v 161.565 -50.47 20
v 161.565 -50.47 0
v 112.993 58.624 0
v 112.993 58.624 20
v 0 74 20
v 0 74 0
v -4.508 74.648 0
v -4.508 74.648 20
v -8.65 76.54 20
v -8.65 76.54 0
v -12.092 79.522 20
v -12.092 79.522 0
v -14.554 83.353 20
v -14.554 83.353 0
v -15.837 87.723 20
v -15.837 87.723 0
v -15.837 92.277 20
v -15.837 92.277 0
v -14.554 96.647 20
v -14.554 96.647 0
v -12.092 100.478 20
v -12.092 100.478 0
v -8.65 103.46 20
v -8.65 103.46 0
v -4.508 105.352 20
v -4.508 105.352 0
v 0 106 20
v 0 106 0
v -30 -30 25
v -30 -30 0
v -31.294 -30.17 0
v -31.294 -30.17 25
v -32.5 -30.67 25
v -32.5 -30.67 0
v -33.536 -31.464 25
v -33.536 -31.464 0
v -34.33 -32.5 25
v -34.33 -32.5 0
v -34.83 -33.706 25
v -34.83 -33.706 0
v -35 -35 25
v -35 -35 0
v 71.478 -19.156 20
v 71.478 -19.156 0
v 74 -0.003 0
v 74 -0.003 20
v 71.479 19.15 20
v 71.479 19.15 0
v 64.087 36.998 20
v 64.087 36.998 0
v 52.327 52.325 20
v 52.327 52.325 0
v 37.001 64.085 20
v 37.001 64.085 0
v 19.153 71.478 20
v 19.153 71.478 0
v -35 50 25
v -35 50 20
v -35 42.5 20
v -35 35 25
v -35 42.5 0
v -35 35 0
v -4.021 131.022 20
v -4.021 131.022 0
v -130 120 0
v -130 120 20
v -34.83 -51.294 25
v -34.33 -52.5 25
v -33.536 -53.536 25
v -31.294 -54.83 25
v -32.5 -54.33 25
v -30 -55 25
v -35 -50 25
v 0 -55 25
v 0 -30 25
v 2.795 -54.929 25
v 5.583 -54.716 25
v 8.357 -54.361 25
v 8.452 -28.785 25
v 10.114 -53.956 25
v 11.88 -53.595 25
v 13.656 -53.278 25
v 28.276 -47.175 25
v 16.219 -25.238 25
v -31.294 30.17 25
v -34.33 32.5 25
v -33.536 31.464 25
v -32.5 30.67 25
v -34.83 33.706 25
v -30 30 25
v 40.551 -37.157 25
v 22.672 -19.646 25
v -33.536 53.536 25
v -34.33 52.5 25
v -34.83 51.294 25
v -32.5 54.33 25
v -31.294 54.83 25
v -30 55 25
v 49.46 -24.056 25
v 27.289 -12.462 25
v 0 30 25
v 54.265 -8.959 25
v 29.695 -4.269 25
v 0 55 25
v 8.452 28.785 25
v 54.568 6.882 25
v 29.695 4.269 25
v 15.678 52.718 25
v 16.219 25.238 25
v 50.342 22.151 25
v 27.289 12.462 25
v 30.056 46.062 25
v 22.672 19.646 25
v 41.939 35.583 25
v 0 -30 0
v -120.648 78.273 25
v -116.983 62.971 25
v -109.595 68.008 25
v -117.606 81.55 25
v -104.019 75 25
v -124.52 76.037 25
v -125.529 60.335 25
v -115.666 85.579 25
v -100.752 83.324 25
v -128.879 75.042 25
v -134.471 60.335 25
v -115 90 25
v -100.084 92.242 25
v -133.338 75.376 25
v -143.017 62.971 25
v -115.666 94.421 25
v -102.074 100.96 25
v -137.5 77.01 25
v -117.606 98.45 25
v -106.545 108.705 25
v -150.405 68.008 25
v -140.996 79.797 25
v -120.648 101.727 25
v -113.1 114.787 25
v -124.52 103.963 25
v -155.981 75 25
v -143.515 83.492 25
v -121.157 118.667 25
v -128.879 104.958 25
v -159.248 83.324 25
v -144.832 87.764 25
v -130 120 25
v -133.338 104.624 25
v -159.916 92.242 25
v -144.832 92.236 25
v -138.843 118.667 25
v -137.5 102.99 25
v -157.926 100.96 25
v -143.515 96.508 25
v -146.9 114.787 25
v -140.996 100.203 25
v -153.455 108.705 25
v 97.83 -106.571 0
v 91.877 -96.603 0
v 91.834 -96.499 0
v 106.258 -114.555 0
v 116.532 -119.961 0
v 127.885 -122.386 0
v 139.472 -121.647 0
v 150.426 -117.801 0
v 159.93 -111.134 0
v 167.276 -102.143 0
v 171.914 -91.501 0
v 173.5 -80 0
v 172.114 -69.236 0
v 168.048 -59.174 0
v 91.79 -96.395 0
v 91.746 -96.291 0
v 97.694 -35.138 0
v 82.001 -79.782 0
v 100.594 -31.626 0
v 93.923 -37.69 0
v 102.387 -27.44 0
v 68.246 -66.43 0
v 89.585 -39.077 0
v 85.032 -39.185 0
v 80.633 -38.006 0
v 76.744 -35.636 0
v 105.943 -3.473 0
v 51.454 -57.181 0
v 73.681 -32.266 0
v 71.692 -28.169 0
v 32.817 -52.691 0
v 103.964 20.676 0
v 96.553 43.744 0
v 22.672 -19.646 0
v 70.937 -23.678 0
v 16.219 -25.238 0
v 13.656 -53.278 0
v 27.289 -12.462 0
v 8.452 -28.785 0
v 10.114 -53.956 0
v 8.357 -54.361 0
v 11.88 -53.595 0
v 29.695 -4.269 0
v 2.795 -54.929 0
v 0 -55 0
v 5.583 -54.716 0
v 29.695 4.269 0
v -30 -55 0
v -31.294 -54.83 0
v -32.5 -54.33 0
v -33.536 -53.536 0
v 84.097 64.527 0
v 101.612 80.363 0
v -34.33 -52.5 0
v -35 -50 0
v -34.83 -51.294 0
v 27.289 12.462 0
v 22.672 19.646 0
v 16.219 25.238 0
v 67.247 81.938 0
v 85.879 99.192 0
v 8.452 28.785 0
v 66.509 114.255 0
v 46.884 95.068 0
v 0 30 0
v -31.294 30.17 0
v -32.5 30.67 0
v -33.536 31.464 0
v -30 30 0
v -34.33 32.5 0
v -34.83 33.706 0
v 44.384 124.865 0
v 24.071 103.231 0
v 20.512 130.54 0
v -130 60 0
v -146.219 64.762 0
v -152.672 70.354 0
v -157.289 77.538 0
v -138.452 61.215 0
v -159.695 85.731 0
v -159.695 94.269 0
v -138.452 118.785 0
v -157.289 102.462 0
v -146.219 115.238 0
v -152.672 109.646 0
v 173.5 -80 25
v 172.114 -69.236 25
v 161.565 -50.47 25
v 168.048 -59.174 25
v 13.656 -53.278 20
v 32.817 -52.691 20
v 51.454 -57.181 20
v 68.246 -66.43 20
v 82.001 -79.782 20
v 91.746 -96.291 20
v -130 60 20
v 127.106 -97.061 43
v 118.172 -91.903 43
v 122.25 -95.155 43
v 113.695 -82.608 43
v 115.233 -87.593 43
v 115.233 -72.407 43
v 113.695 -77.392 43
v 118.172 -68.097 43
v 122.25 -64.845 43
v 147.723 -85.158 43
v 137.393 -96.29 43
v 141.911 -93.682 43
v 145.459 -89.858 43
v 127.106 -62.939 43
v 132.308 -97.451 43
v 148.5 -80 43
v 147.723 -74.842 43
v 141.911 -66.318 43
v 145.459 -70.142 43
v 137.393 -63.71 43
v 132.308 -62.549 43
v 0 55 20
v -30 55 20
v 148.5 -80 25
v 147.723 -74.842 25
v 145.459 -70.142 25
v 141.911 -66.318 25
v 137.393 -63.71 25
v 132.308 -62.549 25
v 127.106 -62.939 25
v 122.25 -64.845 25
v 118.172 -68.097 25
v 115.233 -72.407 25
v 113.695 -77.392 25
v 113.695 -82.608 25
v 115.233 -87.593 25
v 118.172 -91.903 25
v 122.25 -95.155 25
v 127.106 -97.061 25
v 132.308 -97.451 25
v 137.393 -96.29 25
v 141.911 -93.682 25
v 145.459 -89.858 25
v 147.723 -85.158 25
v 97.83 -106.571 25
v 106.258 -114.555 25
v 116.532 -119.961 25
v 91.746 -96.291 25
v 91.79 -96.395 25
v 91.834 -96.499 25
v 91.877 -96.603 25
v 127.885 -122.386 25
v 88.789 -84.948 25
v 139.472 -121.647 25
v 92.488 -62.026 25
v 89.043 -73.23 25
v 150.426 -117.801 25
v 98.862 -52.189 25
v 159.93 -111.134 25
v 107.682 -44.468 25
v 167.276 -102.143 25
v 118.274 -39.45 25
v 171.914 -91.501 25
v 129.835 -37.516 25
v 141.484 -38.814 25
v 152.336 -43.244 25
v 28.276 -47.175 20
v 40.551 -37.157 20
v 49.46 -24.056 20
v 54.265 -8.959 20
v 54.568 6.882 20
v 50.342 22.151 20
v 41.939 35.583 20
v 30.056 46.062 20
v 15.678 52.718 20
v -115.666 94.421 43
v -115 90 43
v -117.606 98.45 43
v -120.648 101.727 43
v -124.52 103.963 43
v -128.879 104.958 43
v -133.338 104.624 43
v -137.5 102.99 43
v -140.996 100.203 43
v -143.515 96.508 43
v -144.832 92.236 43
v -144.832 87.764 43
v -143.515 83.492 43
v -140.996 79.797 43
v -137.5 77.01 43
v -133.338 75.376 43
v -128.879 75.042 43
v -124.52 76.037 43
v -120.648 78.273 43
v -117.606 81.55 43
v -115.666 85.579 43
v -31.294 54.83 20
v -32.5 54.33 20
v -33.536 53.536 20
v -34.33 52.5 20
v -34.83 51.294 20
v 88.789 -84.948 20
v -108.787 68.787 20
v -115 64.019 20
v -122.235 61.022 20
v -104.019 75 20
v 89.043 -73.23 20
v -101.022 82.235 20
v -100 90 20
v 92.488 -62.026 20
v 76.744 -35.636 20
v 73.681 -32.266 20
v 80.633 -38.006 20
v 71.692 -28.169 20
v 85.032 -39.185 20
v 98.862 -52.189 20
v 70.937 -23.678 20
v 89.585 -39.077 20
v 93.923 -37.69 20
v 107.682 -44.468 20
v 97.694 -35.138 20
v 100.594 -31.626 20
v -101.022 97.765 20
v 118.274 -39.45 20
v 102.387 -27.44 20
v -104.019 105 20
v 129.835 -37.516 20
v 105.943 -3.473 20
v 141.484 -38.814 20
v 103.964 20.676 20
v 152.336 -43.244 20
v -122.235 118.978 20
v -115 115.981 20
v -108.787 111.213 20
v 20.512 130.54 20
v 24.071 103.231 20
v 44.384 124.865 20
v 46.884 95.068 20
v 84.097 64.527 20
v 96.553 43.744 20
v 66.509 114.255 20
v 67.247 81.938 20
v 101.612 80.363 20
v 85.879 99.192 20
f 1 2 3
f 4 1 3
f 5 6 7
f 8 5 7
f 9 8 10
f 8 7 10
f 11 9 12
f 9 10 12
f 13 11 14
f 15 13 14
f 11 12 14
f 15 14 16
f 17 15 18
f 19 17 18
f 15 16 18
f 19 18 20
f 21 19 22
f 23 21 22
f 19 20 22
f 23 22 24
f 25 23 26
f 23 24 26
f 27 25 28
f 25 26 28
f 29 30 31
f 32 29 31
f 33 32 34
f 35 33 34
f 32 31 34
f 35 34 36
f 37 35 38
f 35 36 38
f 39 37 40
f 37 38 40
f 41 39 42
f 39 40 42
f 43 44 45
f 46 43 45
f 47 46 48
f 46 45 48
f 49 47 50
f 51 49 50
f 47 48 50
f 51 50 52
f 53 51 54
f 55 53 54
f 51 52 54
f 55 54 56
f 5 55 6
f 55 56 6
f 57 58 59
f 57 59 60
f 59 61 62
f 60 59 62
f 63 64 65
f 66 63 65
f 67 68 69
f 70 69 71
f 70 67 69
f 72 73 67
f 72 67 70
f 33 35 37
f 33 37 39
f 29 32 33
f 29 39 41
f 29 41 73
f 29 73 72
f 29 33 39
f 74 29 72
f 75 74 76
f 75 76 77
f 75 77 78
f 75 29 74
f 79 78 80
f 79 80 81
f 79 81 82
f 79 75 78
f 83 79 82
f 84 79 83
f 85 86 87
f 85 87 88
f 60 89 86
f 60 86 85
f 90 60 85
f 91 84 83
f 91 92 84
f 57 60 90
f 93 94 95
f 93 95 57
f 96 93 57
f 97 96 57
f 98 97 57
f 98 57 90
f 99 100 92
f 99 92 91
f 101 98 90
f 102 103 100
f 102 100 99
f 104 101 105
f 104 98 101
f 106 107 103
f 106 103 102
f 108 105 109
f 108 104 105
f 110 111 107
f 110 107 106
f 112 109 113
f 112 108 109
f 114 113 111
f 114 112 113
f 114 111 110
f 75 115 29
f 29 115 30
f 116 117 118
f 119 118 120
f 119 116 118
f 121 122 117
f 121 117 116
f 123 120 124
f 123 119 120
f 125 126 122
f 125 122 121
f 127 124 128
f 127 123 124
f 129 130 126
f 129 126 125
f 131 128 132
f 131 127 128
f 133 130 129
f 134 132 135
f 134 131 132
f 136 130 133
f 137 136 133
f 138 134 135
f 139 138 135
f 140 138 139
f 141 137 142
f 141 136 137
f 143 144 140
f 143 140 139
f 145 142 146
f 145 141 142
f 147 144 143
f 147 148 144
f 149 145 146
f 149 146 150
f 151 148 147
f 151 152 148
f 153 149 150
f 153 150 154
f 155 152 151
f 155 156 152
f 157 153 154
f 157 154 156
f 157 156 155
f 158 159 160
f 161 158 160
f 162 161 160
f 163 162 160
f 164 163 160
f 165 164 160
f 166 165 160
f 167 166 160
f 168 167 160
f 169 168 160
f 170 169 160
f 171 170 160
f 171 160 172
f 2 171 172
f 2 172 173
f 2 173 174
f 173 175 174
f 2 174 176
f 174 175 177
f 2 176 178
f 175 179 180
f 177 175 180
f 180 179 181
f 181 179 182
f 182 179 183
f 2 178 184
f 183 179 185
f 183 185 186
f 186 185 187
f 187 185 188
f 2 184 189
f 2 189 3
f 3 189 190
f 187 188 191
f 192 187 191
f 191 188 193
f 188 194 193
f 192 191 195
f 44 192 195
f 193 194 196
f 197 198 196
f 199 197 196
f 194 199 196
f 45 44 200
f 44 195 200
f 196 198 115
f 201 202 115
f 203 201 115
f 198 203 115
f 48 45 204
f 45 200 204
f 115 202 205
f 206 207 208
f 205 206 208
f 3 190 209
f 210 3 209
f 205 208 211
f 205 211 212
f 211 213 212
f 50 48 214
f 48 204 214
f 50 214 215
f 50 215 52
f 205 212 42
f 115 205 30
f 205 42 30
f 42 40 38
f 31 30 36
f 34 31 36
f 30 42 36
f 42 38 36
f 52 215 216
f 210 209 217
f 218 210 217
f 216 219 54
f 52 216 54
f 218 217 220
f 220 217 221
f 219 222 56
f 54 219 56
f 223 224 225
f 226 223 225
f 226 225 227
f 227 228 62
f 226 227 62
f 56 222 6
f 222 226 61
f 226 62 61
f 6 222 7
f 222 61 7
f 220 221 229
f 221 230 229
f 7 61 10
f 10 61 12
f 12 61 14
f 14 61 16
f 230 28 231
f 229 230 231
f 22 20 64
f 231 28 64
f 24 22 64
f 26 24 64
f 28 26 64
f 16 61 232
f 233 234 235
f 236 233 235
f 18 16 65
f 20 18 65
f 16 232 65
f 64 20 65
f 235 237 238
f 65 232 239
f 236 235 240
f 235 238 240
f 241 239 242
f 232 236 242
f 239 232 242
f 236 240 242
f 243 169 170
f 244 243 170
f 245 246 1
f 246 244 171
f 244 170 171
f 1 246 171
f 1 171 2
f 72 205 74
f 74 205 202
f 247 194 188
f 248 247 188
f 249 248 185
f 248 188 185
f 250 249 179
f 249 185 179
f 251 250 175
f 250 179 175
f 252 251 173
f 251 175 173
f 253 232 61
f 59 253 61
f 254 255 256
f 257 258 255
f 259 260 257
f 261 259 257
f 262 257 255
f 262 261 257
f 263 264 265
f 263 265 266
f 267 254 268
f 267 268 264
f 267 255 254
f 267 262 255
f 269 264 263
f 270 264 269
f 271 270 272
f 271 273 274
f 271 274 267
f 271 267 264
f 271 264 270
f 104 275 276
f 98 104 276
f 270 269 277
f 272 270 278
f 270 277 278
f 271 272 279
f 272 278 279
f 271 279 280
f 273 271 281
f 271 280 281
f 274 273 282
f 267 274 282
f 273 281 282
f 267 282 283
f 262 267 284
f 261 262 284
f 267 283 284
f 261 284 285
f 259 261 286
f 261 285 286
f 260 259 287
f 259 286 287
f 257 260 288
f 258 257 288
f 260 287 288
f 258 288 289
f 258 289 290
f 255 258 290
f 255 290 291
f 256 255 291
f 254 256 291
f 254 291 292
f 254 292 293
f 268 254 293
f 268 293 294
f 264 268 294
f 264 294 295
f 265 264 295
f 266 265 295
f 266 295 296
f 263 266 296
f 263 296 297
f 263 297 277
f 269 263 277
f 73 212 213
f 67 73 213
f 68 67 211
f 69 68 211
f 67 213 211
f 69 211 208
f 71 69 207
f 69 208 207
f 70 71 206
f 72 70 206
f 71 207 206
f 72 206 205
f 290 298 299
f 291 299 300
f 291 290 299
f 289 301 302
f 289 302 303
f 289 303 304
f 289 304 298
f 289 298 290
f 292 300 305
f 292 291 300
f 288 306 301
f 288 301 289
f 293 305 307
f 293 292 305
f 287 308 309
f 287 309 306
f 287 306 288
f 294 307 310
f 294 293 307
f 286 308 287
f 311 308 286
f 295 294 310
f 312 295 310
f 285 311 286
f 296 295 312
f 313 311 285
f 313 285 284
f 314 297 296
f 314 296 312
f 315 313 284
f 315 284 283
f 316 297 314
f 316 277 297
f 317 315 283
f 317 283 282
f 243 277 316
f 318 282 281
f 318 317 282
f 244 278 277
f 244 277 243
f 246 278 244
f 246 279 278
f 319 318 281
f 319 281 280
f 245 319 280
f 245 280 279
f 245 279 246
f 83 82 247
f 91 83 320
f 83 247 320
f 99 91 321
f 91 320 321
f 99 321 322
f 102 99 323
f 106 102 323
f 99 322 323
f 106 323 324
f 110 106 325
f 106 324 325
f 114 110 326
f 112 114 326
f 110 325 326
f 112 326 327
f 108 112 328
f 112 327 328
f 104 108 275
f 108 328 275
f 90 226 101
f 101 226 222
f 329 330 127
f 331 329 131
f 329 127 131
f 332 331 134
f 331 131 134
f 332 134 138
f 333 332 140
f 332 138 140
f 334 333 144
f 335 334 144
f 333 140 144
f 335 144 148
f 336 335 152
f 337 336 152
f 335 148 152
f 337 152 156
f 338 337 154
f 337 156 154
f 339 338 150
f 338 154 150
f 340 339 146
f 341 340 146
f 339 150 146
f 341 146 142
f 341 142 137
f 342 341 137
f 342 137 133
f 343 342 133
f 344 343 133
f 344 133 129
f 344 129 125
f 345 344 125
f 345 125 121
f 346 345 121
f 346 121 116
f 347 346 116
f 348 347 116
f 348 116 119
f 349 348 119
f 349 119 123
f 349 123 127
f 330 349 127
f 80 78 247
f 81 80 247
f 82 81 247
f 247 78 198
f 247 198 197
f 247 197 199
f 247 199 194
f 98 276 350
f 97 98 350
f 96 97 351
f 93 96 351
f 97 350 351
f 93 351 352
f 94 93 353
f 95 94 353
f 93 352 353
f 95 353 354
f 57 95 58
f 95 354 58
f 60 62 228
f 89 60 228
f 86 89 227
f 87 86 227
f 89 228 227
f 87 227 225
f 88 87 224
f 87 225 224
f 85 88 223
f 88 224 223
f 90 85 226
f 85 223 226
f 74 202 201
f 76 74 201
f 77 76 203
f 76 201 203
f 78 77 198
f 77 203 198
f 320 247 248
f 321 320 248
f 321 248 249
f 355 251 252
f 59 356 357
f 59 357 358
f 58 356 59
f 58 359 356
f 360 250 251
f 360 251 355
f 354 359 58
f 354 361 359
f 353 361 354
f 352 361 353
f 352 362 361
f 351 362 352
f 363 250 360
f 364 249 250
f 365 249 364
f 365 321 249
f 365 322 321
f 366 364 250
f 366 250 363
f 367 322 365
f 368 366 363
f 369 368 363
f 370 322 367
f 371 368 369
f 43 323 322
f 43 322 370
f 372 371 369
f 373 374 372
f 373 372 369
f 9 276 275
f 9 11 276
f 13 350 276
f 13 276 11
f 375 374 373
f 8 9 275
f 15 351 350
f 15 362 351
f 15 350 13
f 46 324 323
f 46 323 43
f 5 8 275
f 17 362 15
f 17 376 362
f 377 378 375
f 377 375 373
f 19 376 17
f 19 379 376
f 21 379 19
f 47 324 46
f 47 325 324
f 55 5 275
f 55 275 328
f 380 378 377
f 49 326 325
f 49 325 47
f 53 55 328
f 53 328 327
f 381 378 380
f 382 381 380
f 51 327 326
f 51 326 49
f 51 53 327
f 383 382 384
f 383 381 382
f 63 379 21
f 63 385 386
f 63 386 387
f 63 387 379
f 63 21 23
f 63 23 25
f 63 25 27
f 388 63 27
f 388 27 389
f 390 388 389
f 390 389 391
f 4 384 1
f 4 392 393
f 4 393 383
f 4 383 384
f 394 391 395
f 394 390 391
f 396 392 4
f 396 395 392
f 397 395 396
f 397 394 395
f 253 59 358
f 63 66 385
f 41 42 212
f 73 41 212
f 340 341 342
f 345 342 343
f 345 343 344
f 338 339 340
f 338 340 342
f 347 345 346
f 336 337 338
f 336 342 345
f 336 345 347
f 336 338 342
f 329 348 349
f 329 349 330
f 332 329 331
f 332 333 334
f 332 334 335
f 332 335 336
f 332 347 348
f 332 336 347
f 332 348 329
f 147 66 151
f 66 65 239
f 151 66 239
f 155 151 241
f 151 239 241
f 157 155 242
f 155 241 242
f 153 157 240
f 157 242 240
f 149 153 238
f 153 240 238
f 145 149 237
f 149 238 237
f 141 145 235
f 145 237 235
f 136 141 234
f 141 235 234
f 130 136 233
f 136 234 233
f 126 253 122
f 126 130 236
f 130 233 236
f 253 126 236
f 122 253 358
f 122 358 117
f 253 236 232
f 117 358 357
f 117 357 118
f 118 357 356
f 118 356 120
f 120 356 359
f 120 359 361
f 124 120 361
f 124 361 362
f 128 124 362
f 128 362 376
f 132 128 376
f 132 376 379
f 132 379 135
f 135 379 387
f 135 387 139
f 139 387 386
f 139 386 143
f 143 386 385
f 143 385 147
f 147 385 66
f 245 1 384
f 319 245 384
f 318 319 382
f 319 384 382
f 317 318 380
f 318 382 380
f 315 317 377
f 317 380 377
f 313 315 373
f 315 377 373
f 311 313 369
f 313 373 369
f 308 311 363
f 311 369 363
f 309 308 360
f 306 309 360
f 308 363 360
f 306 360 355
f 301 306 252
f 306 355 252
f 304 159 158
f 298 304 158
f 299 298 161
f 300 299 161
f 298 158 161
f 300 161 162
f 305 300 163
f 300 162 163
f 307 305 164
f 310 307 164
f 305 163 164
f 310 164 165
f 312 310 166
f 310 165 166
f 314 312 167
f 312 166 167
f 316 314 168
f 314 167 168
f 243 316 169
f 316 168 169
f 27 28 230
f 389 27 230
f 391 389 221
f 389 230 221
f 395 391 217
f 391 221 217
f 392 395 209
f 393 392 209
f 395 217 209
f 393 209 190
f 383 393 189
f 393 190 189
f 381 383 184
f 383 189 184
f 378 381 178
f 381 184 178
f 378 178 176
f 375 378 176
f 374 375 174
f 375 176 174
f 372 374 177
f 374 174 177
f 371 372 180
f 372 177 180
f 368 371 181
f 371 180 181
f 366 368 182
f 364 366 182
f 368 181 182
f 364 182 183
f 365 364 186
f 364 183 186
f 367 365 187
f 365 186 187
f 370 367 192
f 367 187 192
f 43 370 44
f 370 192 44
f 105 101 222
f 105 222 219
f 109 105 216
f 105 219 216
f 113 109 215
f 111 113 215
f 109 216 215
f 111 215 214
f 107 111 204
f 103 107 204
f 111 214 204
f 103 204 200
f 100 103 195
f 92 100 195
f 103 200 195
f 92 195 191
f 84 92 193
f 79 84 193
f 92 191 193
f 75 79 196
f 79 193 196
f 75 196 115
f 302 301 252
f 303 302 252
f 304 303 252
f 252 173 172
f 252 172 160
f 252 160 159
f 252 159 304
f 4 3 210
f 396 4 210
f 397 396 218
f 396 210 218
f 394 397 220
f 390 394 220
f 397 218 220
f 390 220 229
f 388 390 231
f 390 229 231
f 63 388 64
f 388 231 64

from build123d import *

# Parameters (mm, degrees)
BOSS_EXTRUDE4_DEPTH = 20
SKETCH1_5_R         = 30
SKETCH1_5_R_2       = 15
SKETCH1_5_R_3       = 17.5
BOSS_EXTRUDE5_DEPTH = 25
SKETCH1_6_R         = 15
SKETCH1_6_R_2       = 17.5
BOSS_EXTRUDE6_DEPTH = 43


with BuildPart() as part:
    # Sketch1 → Boss-Extrude4 (new body)
    with BuildSketch(Plane.XY):
        with BuildLine():
            Line((-130, 60), (-35, 42.5))
            Line((-35, 42.5), (-35, 50))
            ThreePointArc((-35, 50), (-33.535533906, 53.535533906), (-30, 55))
            Line((-30, 55), (0, 55))
            ThreePointArc((0, 55), (54.567759373, 6.881833839), (13.655500107, -53.277831382))
            ThreePointArc((13.655500107, -53.277831382), (60.158955917, -61.243831597), (91.746142625, -96.2906317))
            ThreePointArc((91.746142625, -96.2906317), (107.681504867, -44.468355165), (161.565293978, -50.47013708))
            Line((161.565293978, -50.47013708), (112.993286108, 58.624378777))
            ThreePointArc((112.993286108, 58.624378777), (66.508772404, 114.25478106), (-4.020798406, 131.02175198))
            Line((-4.020798406, 131.02175198), (-130, 120))
            ThreePointArc((-130, 120), (-108.786796564, 111.213203436), (-100, 90))
            ThreePointArc((-100, 90), (-108.786796564, 68.786796564), (-130, 60))
        make_face()
        with BuildLine():
            ThreePointArc((0, 106), (84.0970935, 64.526574873), (102.386743403, -27.440021418))
            ThreePointArc((102.386743403, -27.440021418), (82.790250599, -38.752734171), (71.477537847, -19.156241367))
            ThreePointArc((71.477537847, -19.156241367), (58.709291689, 45.046854157), (0, 74))
            ThreePointArc((0, 74), (-16, 90), (0, 106))
        make_face(mode=Mode.SUBTRACT)
    extrude(amount=BOSS_EXTRUDE4_DEPTH)

    # Sketch1<5> → Boss-Extrude5 (add)
    # profile 1 of 3: a face of its own
    with BuildSketch(Plane.XY):
        with BuildLine():
            Line((-35, 50), (-35, 35))
            ThreePointArc((-35, 35), (-33.535533906, 31.464466094), (-30, 30))
            Line((-30, 30), (0, 30))
            ThreePointArc((0, 30), (30, 0), (0, -30))
            Line((0, -30), (-30, -30))
            ThreePointArc((-30, -30), (-33.535533906, -31.464466094), (-35, -35))
            Line((-35, -35), (-35, -50))
            ThreePointArc((-35, -50), (-33.535533906, -53.535533906), (-30, -55))
            Line((-30, -55), (0, -55))
            ThreePointArc((0, -55), (4.190718653, -54.840111936), (8.357072001, -54.361377352))
            ThreePointArc((8.357072001, -54.361377352), (10.996109007, -53.769839654), (13.655500107, -53.277831382))
            ThreePointArc((13.655500107, -53.277831382), (54.567759373, 6.881833839), (0, 55))
            Line((0, 55), (-30, 55))
            ThreePointArc((-30, 55), (-33.535533906, 53.535533906), (-35, 50))
        make_face()
    # profile 2 of 3: a face of its own
    with BuildSketch(Plane.XY):
        with Locations((-130, 90)):
            Circle(SKETCH1_5_R)
        with Locations((-130, 90)):
            Circle(SKETCH1_5_R_2, mode=Mode.SUBTRACT)
    # profile 3 of 3: a face of its own
    with BuildSketch(Plane.XY):
        with BuildLine():
            ThreePointArc((91.877270231, -96.60307247), (170.188604949, -63.553017233), (91.746142625, -96.2906317))
            ThreePointArc((91.746142625, -96.2906317), (91.811890227, -96.446774947), (91.877270231, -96.60307247))
        make_face()
        with Locations((131, -80)):
            Circle(SKETCH1_5_R_3, mode=Mode.SUBTRACT)
    extrude(amount=BOSS_EXTRUDE5_DEPTH)

    # Sketch1<6> → Boss-Extrude6 (add)
    with BuildSketch(Plane.XY):
        with Locations((-130, 90)):
            Circle(SKETCH1_6_R)
        with Locations((131, -80)):
            Circle(SKETCH1_6_R_2)
    extrude(amount=BOSS_EXTRUDE6_DEPTH)


solid = part.part
